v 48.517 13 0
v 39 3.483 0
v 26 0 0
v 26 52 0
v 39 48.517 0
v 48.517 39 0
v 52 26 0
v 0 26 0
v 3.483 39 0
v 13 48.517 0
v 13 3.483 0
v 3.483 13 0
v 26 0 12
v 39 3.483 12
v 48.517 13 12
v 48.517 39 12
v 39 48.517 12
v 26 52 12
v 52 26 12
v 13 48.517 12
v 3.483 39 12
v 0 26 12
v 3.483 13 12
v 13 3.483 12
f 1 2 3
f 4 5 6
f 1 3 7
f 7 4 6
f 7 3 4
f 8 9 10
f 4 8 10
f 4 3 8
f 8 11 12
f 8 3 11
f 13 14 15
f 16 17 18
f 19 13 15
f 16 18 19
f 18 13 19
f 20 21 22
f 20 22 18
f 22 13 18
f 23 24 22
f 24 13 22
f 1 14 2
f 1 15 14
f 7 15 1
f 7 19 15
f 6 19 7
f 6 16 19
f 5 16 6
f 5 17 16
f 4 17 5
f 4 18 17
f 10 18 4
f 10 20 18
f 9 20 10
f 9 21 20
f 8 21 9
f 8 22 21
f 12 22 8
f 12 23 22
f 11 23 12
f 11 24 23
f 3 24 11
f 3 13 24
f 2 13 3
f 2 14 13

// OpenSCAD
$fn = 32;

// ----------------------------------------------------------------------
// Eccentric disc: step, 12 mm thick
// ----------------------------------------------------------------------

// --- parameters (mm) ---
profile_height = 12;      // extrusion height
profile_points = 12;      // points of the closed outline

profile = [[0, 26], [3.483, 13], [13, 3.483], [26, 0], [39, 3.483], [48.517, 13], [52, 26], [48.517, 39], [39, 48.517], [26, 52], [13, 48.517], [3.483, 39]];  // single closed polygon, 12 points, counter clockwise

// --- the one profile operation ---
linear_extrude(height = profile_height) polygon(points = profile);
